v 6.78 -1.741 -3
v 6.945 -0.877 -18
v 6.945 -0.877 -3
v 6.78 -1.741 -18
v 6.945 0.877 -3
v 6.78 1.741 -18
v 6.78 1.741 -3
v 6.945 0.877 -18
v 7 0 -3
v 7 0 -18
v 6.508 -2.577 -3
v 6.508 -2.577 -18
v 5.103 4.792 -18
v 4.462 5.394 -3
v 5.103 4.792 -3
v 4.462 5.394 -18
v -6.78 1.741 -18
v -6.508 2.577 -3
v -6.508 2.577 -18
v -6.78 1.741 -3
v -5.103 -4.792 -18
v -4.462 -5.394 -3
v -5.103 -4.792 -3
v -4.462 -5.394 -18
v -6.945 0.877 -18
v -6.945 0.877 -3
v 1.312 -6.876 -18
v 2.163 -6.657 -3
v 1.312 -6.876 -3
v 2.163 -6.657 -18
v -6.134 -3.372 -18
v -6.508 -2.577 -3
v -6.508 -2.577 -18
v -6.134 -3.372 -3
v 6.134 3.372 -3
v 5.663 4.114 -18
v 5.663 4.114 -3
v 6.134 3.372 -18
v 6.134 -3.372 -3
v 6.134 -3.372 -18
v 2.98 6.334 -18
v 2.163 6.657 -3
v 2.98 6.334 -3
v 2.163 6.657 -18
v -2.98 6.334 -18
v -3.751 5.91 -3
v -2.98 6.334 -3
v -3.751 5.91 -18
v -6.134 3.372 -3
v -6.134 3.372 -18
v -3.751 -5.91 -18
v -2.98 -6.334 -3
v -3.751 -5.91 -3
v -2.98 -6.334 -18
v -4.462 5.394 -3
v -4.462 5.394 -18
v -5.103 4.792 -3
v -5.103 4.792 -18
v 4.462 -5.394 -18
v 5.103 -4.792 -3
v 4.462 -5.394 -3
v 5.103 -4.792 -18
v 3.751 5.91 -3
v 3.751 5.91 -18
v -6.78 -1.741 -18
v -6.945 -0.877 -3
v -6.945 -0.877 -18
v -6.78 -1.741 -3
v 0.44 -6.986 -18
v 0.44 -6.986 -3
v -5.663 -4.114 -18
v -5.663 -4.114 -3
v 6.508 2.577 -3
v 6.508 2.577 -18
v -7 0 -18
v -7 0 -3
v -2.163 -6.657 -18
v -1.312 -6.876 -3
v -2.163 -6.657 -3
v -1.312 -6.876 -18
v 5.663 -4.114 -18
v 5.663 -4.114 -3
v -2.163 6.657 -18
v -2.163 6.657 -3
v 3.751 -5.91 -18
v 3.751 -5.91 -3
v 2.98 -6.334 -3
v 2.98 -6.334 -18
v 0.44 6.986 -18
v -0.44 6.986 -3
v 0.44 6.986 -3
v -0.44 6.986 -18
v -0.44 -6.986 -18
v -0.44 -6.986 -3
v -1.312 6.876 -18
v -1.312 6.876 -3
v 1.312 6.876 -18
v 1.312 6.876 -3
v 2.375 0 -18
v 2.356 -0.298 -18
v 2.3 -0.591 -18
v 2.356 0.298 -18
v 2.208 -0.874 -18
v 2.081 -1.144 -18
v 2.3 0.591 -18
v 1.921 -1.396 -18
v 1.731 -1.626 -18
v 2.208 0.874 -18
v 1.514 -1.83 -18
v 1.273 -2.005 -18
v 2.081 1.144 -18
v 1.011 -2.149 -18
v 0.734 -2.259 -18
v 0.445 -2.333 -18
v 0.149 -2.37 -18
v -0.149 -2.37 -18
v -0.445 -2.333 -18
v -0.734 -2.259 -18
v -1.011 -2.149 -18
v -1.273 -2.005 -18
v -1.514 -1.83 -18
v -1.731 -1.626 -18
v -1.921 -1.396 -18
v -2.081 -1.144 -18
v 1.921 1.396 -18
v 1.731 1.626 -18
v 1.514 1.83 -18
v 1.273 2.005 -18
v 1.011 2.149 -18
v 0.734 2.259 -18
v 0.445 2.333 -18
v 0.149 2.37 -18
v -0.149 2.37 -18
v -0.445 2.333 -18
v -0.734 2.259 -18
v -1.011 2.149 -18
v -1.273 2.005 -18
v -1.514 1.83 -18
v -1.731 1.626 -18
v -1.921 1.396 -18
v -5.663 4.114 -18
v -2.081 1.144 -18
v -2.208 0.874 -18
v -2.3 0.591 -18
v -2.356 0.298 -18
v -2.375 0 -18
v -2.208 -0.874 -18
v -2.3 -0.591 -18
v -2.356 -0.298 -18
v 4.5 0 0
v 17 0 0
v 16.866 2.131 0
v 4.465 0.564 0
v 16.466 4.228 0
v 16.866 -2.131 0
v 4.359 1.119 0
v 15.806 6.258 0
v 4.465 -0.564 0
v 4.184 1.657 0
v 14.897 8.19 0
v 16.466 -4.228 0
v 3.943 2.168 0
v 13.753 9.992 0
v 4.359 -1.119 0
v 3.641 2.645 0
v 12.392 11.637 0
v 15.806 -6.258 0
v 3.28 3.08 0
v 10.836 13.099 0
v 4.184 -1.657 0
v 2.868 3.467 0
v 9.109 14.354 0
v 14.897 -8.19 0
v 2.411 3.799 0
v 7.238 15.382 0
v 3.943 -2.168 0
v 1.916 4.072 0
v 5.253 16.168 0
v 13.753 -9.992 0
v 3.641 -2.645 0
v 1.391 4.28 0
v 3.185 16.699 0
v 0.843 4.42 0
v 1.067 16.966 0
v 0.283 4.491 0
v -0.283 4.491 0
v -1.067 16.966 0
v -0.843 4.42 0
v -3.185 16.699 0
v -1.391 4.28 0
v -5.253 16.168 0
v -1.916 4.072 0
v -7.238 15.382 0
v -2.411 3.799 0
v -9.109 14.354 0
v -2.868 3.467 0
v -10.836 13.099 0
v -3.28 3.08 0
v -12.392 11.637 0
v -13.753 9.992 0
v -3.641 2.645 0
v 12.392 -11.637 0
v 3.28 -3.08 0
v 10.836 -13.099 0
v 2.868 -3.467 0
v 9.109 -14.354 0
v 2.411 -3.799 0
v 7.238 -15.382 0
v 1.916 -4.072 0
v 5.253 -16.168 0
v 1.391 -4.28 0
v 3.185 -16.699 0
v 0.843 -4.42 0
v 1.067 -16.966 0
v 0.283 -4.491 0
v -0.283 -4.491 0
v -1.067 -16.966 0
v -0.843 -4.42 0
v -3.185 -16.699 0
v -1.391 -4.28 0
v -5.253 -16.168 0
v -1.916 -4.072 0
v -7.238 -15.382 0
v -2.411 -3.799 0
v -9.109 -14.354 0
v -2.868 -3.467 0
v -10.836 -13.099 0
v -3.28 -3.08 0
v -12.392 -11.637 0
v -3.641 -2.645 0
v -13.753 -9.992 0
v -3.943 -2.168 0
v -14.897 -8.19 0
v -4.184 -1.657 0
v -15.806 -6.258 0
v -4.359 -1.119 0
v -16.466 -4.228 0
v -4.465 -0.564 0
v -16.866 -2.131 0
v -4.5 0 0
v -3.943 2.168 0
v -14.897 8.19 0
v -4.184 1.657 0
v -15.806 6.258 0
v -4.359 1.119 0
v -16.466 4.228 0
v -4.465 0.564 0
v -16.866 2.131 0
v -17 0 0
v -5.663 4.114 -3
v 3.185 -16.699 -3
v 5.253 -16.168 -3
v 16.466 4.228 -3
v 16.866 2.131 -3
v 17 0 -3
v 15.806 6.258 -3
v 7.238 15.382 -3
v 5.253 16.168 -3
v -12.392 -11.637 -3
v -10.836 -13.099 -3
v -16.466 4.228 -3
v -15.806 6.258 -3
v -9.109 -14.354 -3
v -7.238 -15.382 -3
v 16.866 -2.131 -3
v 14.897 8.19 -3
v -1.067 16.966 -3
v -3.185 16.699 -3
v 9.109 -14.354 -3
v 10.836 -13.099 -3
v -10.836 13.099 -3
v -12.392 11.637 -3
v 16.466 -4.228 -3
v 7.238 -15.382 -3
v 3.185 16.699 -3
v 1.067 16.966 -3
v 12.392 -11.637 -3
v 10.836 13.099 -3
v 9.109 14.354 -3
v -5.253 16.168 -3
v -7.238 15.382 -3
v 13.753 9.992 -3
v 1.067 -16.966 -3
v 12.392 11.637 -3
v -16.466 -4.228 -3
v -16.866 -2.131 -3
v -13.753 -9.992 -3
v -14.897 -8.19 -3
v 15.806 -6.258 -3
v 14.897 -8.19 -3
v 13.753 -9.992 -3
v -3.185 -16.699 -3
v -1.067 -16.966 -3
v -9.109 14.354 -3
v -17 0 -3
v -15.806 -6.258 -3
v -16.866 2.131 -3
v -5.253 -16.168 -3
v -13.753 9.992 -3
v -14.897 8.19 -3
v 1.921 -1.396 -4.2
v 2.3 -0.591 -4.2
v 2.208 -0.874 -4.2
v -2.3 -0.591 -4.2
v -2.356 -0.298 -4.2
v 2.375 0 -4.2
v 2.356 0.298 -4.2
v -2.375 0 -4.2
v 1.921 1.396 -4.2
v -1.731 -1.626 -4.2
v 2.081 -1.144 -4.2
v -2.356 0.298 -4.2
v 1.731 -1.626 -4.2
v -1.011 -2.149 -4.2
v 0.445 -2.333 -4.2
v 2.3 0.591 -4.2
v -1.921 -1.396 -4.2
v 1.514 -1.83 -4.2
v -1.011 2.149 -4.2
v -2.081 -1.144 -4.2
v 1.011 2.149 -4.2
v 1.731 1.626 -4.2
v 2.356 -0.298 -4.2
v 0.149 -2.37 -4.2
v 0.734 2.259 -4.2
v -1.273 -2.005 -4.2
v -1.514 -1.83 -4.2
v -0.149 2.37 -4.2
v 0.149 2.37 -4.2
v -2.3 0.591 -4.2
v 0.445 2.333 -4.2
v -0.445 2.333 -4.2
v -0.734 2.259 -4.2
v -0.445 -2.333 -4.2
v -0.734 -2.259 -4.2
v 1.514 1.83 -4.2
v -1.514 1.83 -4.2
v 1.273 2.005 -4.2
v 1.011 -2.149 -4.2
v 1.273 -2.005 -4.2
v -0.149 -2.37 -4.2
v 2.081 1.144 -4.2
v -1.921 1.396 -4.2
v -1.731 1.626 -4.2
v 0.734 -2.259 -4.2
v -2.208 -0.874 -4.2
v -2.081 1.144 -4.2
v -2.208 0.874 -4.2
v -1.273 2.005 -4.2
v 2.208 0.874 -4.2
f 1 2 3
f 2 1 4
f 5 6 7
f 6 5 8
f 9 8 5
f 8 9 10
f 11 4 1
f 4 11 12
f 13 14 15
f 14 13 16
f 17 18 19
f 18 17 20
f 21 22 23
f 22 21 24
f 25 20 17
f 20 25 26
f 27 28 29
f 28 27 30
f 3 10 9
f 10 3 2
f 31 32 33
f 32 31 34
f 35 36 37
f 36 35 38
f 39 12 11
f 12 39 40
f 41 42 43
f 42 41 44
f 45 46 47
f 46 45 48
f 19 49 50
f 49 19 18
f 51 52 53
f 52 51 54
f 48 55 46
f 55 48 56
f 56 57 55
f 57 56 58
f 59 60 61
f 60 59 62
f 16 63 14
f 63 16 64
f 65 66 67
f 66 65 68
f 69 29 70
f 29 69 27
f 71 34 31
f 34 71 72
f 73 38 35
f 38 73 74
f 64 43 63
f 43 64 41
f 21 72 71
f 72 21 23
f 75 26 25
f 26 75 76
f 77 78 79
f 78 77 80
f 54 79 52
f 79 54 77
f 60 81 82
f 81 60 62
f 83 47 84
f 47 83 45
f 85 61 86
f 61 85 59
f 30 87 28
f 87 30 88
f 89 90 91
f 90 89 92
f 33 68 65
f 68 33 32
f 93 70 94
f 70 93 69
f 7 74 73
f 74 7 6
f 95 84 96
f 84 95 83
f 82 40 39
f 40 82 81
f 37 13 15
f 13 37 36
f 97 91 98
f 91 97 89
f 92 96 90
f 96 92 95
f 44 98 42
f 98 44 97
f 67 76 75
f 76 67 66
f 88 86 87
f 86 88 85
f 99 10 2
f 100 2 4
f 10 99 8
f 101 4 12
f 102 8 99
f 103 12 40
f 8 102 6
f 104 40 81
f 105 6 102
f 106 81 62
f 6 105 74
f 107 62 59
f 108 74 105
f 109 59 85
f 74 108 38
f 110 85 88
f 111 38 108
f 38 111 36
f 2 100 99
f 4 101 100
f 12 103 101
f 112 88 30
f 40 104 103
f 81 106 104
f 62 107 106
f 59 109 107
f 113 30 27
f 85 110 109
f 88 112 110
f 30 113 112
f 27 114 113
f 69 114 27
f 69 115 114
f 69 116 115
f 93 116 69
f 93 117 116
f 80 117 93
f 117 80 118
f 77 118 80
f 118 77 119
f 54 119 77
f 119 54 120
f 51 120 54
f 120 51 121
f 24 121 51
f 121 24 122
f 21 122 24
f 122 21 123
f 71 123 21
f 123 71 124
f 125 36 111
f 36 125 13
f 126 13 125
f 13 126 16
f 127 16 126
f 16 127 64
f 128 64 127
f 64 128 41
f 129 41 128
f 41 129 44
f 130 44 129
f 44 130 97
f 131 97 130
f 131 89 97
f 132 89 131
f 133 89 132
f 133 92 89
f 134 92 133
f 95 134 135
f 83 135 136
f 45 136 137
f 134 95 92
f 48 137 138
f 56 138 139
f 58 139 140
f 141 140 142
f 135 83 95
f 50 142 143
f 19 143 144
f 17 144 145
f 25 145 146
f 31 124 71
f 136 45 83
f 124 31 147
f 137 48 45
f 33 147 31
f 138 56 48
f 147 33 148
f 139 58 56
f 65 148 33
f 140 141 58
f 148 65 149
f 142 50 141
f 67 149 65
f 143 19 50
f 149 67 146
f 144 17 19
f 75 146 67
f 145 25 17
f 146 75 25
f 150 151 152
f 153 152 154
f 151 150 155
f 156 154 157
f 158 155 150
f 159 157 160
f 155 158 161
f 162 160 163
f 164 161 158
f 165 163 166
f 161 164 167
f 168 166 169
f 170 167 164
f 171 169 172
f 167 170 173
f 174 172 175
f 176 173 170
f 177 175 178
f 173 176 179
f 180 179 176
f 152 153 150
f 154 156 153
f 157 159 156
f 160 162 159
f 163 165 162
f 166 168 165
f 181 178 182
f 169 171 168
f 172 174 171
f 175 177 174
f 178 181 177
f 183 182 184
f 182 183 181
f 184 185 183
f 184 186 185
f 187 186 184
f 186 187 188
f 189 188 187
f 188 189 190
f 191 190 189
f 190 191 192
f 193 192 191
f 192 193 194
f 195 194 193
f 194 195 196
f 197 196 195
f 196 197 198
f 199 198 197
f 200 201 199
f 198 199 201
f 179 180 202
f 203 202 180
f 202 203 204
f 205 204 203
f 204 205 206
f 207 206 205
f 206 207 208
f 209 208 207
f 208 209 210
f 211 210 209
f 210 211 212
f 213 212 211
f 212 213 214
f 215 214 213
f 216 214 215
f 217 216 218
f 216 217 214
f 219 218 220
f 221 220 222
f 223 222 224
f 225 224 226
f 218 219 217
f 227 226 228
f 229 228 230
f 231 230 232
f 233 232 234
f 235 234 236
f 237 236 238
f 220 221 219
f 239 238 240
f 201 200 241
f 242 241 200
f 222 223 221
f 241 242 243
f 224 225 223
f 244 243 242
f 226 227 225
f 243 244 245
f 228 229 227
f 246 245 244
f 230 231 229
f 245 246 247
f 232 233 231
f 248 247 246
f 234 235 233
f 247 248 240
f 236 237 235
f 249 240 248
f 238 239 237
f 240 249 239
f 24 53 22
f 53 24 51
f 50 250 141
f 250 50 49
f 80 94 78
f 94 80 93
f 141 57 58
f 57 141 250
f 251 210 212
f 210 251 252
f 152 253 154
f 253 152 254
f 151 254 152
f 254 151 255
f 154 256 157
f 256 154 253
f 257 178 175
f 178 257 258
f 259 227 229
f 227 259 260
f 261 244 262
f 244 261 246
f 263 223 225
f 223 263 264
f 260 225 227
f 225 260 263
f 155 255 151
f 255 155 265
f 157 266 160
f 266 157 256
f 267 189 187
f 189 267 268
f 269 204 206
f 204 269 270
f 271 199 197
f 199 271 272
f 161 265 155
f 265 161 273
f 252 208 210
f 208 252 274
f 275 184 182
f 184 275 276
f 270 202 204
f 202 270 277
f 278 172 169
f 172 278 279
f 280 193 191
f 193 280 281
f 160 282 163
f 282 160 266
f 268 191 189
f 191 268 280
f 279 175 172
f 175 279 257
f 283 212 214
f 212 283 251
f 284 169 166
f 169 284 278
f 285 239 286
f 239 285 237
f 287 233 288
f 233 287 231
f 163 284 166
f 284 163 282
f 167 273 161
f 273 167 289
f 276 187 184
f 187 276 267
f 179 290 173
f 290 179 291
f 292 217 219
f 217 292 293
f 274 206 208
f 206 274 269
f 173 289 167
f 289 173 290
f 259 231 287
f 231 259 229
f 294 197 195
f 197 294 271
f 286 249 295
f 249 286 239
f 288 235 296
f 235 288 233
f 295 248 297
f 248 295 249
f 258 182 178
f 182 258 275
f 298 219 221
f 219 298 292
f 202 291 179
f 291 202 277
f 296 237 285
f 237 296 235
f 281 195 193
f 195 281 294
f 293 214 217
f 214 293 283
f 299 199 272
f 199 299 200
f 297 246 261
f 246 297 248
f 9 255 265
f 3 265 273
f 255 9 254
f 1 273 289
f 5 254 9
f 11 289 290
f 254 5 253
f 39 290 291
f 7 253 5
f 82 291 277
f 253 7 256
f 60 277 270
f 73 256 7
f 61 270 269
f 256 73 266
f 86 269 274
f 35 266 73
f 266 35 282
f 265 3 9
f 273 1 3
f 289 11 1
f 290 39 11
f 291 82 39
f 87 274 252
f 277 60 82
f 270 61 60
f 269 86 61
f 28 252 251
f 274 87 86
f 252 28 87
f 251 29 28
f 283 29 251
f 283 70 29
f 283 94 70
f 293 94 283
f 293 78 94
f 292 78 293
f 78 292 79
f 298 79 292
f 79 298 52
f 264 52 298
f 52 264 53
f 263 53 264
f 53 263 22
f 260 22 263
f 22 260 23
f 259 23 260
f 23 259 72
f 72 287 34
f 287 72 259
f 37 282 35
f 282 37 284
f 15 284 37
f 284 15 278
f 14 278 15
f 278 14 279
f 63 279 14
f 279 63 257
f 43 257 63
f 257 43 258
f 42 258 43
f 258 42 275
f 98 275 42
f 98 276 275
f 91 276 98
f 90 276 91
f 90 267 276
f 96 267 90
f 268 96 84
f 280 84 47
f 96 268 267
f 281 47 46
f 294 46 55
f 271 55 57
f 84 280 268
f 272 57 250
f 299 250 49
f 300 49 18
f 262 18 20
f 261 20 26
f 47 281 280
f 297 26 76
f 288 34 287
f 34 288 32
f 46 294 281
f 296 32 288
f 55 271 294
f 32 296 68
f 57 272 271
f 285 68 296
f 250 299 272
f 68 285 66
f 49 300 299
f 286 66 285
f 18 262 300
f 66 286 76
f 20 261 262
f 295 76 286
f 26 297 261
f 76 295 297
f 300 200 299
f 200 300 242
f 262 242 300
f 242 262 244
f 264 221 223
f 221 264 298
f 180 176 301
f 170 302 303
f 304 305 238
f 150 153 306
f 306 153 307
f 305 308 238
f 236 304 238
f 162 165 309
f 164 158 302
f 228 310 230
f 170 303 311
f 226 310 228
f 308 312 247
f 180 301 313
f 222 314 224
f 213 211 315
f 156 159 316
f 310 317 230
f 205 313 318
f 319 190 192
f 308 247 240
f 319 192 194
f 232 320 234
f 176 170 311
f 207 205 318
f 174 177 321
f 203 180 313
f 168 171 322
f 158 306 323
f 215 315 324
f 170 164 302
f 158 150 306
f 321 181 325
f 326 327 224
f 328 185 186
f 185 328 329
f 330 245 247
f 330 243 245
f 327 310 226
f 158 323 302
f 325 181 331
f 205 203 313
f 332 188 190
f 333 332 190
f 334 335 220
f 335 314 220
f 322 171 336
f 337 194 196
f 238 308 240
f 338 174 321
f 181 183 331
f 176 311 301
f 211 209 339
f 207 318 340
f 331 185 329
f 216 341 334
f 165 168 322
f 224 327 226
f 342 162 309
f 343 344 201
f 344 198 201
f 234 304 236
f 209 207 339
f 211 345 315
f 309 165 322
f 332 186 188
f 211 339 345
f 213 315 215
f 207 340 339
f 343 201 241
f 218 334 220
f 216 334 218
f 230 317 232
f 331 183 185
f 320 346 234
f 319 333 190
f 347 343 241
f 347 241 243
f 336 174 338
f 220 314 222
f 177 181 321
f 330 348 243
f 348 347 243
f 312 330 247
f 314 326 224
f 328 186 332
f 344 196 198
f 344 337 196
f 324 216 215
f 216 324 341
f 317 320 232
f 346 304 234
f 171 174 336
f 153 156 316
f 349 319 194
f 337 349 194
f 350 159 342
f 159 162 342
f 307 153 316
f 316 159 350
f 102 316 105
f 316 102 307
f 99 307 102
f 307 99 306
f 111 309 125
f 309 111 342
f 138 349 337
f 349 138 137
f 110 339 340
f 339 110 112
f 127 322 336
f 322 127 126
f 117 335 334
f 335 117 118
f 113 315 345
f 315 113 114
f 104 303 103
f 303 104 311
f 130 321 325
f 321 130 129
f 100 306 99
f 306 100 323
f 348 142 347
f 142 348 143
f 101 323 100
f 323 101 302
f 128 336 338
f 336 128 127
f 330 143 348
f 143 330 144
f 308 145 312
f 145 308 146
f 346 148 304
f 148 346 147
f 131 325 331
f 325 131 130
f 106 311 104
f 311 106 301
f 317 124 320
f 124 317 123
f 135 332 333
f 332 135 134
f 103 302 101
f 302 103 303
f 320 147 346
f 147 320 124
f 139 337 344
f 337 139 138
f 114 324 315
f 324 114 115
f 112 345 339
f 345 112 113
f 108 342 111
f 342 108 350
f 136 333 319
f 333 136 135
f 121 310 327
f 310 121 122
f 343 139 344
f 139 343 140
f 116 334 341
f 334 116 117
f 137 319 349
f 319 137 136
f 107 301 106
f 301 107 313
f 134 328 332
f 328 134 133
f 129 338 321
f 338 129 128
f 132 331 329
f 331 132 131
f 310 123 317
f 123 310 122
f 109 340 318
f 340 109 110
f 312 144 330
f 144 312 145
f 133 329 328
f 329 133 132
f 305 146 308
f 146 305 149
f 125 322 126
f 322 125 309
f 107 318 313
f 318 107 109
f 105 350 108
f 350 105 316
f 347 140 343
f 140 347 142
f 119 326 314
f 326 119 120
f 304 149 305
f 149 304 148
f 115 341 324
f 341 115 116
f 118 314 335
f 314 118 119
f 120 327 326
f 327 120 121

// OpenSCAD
$fn = 50;


difference() {
	union() {
		translate(v = [0, 0, -18.0000000000]) {
			cylinder(h = 18, r = 7.0000000000);
		}
		translate(v = [0, 0, -3.0000000000]) {
			cylinder(h = 3, r = 17.0000000000);
		}
	}
	union() {
		translate(v = [0, 0, 0]) {
			rotate(a = [0, 0, 0]) {
				difference() {
					union() {
						#translate(v = [0, 0, -18.0000000000]) {
							cylinder(h = 18, r = 2.2500000000);
						}
						#translate(v = [0, 0, -4.2000000000]) {
							cylinder(h = 4.2000000000, r = 7.0000000000, r1 = 2.3750000000, r2 = 4.5000000000);
						}
						#translate(v = [0, 0, -18.0000000000]) {
							cylinder(h = 18, r = 2.3750000000);
						}
						#translate(v = [0, 0, -18.0000000000]) {
							cylinder(h = 18, r = 2.2500000000);
						}
					}
					union();
				}
			}
		}
	}
}
